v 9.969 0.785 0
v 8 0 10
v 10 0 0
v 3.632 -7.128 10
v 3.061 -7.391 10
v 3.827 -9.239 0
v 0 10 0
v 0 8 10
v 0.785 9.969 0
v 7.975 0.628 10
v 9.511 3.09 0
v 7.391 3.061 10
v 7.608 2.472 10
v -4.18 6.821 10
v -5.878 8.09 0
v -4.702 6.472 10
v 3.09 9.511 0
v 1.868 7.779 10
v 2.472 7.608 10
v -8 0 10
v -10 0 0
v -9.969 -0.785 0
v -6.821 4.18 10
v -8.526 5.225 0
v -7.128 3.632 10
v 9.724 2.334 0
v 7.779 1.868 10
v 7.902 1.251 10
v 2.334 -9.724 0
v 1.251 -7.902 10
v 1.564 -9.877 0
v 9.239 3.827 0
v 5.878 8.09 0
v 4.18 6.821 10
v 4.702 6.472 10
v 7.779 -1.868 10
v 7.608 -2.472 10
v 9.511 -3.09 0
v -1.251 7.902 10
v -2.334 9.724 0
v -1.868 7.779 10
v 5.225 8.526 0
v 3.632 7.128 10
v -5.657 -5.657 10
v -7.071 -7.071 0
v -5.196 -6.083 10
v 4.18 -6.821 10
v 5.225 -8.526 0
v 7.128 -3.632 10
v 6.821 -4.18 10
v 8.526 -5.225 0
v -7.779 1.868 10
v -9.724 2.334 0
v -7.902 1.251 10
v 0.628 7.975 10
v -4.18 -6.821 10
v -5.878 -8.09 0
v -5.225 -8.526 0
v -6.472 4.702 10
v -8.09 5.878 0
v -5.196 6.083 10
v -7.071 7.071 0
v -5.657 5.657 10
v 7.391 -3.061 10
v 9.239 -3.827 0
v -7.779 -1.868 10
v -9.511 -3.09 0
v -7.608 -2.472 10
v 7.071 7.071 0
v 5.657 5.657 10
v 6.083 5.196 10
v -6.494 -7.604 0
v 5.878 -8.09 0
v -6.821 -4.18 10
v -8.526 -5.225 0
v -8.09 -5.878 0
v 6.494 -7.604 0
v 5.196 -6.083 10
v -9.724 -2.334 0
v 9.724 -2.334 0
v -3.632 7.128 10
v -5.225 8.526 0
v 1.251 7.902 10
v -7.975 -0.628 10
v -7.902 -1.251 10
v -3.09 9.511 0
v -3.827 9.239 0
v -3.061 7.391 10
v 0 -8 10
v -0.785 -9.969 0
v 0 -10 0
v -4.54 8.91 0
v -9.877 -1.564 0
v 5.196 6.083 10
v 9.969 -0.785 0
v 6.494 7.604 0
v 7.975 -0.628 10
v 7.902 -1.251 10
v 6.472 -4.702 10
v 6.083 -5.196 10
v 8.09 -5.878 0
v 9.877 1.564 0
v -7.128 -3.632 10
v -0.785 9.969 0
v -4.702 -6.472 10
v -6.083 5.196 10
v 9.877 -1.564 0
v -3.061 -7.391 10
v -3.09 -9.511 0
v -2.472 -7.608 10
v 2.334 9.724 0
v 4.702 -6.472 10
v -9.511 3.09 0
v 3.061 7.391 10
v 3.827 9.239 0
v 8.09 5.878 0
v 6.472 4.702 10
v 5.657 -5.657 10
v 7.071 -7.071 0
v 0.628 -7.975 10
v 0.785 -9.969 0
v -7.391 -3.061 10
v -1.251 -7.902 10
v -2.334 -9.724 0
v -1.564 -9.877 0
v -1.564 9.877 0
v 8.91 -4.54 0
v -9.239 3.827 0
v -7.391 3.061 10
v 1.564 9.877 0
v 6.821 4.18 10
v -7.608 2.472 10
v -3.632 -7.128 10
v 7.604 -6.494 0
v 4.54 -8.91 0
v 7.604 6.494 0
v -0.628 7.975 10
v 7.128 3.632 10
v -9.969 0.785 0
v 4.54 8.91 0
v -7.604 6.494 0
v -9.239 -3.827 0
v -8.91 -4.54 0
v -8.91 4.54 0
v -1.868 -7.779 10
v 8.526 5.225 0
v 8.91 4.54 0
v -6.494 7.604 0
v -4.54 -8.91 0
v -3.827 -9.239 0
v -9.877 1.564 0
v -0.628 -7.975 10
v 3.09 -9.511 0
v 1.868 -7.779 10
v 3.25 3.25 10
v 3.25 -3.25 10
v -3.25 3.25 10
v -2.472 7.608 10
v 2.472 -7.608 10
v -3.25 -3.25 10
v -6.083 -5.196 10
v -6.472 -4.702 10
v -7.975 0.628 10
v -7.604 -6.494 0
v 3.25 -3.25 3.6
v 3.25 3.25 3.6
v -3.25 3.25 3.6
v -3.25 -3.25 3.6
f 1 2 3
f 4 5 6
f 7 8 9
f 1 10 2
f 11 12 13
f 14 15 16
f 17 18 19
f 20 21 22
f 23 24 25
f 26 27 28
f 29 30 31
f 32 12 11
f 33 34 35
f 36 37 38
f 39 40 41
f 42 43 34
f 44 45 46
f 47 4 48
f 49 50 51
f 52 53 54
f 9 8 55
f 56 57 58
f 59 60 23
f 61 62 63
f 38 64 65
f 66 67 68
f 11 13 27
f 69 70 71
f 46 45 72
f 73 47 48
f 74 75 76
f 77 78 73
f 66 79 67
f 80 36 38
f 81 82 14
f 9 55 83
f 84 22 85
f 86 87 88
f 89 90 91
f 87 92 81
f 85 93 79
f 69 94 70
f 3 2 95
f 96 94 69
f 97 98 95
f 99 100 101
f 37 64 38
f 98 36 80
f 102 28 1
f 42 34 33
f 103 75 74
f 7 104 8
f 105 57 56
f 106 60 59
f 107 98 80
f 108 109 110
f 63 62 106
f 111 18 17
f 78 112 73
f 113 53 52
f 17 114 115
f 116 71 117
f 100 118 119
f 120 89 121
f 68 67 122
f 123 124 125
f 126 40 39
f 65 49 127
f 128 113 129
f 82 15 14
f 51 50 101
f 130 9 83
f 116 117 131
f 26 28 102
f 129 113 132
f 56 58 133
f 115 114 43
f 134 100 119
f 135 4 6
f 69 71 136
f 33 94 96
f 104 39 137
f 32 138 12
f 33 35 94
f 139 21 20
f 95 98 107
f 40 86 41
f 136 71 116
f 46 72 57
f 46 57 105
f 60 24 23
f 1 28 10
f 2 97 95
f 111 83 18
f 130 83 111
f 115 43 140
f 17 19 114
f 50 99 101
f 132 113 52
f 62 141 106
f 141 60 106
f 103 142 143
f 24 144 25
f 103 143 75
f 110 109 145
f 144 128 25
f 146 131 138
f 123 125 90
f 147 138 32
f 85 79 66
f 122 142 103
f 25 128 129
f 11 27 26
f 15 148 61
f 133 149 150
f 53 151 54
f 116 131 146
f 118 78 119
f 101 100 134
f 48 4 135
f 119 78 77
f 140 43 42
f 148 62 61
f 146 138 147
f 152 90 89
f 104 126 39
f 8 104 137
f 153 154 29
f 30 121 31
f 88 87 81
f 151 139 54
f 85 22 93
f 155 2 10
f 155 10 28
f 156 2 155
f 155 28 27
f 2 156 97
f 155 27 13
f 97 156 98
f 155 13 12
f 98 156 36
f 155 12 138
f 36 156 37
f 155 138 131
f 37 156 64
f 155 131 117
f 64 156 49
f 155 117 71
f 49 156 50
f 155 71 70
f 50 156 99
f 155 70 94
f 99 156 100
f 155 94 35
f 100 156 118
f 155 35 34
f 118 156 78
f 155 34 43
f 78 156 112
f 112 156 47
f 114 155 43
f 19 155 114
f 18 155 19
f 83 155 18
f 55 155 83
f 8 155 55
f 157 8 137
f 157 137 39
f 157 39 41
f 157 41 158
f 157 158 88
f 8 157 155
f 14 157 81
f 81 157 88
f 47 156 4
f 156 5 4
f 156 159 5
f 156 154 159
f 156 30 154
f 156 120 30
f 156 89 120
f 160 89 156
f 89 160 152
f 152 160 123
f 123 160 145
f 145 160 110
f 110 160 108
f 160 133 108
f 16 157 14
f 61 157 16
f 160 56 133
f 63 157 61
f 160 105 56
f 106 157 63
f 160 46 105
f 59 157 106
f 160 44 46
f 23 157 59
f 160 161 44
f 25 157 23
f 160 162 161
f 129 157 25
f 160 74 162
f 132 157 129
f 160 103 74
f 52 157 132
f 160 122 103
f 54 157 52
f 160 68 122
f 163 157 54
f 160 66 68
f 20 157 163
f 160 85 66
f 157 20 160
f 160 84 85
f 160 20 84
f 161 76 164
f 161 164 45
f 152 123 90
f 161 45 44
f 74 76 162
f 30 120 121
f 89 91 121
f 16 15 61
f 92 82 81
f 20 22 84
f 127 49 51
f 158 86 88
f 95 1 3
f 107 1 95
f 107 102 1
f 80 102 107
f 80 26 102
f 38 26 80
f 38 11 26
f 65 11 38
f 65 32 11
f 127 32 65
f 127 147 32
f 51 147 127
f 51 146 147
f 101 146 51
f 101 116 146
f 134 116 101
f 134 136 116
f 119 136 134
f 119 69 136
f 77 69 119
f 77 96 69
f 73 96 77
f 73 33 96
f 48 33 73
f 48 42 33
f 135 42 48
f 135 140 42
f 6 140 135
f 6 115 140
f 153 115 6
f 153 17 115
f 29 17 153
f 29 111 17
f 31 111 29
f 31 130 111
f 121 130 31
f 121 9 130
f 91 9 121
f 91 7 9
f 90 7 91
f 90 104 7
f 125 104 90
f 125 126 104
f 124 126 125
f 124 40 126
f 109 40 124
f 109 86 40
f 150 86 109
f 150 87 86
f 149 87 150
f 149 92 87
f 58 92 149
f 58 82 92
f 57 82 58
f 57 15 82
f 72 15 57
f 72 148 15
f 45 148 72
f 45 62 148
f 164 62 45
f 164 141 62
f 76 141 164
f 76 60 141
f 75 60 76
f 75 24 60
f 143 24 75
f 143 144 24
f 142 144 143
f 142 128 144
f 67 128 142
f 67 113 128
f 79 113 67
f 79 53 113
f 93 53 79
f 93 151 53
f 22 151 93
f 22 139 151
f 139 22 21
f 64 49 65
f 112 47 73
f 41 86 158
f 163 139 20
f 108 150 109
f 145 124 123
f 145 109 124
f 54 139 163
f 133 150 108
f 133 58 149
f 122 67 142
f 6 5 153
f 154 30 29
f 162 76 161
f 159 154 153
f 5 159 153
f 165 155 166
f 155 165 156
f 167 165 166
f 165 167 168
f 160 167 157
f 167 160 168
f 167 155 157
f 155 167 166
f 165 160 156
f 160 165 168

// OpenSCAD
$fn=80;
rc1 = 10;
rc2 = 8;
hh = 10;
d = 6.5;
w = 6.5;

difference()
{
cylinder(r1=rc1, h=hh, r2=rc2);

translate([-w/2,-w/2,hh-d+.1])
cube([w,w,d]);
}
